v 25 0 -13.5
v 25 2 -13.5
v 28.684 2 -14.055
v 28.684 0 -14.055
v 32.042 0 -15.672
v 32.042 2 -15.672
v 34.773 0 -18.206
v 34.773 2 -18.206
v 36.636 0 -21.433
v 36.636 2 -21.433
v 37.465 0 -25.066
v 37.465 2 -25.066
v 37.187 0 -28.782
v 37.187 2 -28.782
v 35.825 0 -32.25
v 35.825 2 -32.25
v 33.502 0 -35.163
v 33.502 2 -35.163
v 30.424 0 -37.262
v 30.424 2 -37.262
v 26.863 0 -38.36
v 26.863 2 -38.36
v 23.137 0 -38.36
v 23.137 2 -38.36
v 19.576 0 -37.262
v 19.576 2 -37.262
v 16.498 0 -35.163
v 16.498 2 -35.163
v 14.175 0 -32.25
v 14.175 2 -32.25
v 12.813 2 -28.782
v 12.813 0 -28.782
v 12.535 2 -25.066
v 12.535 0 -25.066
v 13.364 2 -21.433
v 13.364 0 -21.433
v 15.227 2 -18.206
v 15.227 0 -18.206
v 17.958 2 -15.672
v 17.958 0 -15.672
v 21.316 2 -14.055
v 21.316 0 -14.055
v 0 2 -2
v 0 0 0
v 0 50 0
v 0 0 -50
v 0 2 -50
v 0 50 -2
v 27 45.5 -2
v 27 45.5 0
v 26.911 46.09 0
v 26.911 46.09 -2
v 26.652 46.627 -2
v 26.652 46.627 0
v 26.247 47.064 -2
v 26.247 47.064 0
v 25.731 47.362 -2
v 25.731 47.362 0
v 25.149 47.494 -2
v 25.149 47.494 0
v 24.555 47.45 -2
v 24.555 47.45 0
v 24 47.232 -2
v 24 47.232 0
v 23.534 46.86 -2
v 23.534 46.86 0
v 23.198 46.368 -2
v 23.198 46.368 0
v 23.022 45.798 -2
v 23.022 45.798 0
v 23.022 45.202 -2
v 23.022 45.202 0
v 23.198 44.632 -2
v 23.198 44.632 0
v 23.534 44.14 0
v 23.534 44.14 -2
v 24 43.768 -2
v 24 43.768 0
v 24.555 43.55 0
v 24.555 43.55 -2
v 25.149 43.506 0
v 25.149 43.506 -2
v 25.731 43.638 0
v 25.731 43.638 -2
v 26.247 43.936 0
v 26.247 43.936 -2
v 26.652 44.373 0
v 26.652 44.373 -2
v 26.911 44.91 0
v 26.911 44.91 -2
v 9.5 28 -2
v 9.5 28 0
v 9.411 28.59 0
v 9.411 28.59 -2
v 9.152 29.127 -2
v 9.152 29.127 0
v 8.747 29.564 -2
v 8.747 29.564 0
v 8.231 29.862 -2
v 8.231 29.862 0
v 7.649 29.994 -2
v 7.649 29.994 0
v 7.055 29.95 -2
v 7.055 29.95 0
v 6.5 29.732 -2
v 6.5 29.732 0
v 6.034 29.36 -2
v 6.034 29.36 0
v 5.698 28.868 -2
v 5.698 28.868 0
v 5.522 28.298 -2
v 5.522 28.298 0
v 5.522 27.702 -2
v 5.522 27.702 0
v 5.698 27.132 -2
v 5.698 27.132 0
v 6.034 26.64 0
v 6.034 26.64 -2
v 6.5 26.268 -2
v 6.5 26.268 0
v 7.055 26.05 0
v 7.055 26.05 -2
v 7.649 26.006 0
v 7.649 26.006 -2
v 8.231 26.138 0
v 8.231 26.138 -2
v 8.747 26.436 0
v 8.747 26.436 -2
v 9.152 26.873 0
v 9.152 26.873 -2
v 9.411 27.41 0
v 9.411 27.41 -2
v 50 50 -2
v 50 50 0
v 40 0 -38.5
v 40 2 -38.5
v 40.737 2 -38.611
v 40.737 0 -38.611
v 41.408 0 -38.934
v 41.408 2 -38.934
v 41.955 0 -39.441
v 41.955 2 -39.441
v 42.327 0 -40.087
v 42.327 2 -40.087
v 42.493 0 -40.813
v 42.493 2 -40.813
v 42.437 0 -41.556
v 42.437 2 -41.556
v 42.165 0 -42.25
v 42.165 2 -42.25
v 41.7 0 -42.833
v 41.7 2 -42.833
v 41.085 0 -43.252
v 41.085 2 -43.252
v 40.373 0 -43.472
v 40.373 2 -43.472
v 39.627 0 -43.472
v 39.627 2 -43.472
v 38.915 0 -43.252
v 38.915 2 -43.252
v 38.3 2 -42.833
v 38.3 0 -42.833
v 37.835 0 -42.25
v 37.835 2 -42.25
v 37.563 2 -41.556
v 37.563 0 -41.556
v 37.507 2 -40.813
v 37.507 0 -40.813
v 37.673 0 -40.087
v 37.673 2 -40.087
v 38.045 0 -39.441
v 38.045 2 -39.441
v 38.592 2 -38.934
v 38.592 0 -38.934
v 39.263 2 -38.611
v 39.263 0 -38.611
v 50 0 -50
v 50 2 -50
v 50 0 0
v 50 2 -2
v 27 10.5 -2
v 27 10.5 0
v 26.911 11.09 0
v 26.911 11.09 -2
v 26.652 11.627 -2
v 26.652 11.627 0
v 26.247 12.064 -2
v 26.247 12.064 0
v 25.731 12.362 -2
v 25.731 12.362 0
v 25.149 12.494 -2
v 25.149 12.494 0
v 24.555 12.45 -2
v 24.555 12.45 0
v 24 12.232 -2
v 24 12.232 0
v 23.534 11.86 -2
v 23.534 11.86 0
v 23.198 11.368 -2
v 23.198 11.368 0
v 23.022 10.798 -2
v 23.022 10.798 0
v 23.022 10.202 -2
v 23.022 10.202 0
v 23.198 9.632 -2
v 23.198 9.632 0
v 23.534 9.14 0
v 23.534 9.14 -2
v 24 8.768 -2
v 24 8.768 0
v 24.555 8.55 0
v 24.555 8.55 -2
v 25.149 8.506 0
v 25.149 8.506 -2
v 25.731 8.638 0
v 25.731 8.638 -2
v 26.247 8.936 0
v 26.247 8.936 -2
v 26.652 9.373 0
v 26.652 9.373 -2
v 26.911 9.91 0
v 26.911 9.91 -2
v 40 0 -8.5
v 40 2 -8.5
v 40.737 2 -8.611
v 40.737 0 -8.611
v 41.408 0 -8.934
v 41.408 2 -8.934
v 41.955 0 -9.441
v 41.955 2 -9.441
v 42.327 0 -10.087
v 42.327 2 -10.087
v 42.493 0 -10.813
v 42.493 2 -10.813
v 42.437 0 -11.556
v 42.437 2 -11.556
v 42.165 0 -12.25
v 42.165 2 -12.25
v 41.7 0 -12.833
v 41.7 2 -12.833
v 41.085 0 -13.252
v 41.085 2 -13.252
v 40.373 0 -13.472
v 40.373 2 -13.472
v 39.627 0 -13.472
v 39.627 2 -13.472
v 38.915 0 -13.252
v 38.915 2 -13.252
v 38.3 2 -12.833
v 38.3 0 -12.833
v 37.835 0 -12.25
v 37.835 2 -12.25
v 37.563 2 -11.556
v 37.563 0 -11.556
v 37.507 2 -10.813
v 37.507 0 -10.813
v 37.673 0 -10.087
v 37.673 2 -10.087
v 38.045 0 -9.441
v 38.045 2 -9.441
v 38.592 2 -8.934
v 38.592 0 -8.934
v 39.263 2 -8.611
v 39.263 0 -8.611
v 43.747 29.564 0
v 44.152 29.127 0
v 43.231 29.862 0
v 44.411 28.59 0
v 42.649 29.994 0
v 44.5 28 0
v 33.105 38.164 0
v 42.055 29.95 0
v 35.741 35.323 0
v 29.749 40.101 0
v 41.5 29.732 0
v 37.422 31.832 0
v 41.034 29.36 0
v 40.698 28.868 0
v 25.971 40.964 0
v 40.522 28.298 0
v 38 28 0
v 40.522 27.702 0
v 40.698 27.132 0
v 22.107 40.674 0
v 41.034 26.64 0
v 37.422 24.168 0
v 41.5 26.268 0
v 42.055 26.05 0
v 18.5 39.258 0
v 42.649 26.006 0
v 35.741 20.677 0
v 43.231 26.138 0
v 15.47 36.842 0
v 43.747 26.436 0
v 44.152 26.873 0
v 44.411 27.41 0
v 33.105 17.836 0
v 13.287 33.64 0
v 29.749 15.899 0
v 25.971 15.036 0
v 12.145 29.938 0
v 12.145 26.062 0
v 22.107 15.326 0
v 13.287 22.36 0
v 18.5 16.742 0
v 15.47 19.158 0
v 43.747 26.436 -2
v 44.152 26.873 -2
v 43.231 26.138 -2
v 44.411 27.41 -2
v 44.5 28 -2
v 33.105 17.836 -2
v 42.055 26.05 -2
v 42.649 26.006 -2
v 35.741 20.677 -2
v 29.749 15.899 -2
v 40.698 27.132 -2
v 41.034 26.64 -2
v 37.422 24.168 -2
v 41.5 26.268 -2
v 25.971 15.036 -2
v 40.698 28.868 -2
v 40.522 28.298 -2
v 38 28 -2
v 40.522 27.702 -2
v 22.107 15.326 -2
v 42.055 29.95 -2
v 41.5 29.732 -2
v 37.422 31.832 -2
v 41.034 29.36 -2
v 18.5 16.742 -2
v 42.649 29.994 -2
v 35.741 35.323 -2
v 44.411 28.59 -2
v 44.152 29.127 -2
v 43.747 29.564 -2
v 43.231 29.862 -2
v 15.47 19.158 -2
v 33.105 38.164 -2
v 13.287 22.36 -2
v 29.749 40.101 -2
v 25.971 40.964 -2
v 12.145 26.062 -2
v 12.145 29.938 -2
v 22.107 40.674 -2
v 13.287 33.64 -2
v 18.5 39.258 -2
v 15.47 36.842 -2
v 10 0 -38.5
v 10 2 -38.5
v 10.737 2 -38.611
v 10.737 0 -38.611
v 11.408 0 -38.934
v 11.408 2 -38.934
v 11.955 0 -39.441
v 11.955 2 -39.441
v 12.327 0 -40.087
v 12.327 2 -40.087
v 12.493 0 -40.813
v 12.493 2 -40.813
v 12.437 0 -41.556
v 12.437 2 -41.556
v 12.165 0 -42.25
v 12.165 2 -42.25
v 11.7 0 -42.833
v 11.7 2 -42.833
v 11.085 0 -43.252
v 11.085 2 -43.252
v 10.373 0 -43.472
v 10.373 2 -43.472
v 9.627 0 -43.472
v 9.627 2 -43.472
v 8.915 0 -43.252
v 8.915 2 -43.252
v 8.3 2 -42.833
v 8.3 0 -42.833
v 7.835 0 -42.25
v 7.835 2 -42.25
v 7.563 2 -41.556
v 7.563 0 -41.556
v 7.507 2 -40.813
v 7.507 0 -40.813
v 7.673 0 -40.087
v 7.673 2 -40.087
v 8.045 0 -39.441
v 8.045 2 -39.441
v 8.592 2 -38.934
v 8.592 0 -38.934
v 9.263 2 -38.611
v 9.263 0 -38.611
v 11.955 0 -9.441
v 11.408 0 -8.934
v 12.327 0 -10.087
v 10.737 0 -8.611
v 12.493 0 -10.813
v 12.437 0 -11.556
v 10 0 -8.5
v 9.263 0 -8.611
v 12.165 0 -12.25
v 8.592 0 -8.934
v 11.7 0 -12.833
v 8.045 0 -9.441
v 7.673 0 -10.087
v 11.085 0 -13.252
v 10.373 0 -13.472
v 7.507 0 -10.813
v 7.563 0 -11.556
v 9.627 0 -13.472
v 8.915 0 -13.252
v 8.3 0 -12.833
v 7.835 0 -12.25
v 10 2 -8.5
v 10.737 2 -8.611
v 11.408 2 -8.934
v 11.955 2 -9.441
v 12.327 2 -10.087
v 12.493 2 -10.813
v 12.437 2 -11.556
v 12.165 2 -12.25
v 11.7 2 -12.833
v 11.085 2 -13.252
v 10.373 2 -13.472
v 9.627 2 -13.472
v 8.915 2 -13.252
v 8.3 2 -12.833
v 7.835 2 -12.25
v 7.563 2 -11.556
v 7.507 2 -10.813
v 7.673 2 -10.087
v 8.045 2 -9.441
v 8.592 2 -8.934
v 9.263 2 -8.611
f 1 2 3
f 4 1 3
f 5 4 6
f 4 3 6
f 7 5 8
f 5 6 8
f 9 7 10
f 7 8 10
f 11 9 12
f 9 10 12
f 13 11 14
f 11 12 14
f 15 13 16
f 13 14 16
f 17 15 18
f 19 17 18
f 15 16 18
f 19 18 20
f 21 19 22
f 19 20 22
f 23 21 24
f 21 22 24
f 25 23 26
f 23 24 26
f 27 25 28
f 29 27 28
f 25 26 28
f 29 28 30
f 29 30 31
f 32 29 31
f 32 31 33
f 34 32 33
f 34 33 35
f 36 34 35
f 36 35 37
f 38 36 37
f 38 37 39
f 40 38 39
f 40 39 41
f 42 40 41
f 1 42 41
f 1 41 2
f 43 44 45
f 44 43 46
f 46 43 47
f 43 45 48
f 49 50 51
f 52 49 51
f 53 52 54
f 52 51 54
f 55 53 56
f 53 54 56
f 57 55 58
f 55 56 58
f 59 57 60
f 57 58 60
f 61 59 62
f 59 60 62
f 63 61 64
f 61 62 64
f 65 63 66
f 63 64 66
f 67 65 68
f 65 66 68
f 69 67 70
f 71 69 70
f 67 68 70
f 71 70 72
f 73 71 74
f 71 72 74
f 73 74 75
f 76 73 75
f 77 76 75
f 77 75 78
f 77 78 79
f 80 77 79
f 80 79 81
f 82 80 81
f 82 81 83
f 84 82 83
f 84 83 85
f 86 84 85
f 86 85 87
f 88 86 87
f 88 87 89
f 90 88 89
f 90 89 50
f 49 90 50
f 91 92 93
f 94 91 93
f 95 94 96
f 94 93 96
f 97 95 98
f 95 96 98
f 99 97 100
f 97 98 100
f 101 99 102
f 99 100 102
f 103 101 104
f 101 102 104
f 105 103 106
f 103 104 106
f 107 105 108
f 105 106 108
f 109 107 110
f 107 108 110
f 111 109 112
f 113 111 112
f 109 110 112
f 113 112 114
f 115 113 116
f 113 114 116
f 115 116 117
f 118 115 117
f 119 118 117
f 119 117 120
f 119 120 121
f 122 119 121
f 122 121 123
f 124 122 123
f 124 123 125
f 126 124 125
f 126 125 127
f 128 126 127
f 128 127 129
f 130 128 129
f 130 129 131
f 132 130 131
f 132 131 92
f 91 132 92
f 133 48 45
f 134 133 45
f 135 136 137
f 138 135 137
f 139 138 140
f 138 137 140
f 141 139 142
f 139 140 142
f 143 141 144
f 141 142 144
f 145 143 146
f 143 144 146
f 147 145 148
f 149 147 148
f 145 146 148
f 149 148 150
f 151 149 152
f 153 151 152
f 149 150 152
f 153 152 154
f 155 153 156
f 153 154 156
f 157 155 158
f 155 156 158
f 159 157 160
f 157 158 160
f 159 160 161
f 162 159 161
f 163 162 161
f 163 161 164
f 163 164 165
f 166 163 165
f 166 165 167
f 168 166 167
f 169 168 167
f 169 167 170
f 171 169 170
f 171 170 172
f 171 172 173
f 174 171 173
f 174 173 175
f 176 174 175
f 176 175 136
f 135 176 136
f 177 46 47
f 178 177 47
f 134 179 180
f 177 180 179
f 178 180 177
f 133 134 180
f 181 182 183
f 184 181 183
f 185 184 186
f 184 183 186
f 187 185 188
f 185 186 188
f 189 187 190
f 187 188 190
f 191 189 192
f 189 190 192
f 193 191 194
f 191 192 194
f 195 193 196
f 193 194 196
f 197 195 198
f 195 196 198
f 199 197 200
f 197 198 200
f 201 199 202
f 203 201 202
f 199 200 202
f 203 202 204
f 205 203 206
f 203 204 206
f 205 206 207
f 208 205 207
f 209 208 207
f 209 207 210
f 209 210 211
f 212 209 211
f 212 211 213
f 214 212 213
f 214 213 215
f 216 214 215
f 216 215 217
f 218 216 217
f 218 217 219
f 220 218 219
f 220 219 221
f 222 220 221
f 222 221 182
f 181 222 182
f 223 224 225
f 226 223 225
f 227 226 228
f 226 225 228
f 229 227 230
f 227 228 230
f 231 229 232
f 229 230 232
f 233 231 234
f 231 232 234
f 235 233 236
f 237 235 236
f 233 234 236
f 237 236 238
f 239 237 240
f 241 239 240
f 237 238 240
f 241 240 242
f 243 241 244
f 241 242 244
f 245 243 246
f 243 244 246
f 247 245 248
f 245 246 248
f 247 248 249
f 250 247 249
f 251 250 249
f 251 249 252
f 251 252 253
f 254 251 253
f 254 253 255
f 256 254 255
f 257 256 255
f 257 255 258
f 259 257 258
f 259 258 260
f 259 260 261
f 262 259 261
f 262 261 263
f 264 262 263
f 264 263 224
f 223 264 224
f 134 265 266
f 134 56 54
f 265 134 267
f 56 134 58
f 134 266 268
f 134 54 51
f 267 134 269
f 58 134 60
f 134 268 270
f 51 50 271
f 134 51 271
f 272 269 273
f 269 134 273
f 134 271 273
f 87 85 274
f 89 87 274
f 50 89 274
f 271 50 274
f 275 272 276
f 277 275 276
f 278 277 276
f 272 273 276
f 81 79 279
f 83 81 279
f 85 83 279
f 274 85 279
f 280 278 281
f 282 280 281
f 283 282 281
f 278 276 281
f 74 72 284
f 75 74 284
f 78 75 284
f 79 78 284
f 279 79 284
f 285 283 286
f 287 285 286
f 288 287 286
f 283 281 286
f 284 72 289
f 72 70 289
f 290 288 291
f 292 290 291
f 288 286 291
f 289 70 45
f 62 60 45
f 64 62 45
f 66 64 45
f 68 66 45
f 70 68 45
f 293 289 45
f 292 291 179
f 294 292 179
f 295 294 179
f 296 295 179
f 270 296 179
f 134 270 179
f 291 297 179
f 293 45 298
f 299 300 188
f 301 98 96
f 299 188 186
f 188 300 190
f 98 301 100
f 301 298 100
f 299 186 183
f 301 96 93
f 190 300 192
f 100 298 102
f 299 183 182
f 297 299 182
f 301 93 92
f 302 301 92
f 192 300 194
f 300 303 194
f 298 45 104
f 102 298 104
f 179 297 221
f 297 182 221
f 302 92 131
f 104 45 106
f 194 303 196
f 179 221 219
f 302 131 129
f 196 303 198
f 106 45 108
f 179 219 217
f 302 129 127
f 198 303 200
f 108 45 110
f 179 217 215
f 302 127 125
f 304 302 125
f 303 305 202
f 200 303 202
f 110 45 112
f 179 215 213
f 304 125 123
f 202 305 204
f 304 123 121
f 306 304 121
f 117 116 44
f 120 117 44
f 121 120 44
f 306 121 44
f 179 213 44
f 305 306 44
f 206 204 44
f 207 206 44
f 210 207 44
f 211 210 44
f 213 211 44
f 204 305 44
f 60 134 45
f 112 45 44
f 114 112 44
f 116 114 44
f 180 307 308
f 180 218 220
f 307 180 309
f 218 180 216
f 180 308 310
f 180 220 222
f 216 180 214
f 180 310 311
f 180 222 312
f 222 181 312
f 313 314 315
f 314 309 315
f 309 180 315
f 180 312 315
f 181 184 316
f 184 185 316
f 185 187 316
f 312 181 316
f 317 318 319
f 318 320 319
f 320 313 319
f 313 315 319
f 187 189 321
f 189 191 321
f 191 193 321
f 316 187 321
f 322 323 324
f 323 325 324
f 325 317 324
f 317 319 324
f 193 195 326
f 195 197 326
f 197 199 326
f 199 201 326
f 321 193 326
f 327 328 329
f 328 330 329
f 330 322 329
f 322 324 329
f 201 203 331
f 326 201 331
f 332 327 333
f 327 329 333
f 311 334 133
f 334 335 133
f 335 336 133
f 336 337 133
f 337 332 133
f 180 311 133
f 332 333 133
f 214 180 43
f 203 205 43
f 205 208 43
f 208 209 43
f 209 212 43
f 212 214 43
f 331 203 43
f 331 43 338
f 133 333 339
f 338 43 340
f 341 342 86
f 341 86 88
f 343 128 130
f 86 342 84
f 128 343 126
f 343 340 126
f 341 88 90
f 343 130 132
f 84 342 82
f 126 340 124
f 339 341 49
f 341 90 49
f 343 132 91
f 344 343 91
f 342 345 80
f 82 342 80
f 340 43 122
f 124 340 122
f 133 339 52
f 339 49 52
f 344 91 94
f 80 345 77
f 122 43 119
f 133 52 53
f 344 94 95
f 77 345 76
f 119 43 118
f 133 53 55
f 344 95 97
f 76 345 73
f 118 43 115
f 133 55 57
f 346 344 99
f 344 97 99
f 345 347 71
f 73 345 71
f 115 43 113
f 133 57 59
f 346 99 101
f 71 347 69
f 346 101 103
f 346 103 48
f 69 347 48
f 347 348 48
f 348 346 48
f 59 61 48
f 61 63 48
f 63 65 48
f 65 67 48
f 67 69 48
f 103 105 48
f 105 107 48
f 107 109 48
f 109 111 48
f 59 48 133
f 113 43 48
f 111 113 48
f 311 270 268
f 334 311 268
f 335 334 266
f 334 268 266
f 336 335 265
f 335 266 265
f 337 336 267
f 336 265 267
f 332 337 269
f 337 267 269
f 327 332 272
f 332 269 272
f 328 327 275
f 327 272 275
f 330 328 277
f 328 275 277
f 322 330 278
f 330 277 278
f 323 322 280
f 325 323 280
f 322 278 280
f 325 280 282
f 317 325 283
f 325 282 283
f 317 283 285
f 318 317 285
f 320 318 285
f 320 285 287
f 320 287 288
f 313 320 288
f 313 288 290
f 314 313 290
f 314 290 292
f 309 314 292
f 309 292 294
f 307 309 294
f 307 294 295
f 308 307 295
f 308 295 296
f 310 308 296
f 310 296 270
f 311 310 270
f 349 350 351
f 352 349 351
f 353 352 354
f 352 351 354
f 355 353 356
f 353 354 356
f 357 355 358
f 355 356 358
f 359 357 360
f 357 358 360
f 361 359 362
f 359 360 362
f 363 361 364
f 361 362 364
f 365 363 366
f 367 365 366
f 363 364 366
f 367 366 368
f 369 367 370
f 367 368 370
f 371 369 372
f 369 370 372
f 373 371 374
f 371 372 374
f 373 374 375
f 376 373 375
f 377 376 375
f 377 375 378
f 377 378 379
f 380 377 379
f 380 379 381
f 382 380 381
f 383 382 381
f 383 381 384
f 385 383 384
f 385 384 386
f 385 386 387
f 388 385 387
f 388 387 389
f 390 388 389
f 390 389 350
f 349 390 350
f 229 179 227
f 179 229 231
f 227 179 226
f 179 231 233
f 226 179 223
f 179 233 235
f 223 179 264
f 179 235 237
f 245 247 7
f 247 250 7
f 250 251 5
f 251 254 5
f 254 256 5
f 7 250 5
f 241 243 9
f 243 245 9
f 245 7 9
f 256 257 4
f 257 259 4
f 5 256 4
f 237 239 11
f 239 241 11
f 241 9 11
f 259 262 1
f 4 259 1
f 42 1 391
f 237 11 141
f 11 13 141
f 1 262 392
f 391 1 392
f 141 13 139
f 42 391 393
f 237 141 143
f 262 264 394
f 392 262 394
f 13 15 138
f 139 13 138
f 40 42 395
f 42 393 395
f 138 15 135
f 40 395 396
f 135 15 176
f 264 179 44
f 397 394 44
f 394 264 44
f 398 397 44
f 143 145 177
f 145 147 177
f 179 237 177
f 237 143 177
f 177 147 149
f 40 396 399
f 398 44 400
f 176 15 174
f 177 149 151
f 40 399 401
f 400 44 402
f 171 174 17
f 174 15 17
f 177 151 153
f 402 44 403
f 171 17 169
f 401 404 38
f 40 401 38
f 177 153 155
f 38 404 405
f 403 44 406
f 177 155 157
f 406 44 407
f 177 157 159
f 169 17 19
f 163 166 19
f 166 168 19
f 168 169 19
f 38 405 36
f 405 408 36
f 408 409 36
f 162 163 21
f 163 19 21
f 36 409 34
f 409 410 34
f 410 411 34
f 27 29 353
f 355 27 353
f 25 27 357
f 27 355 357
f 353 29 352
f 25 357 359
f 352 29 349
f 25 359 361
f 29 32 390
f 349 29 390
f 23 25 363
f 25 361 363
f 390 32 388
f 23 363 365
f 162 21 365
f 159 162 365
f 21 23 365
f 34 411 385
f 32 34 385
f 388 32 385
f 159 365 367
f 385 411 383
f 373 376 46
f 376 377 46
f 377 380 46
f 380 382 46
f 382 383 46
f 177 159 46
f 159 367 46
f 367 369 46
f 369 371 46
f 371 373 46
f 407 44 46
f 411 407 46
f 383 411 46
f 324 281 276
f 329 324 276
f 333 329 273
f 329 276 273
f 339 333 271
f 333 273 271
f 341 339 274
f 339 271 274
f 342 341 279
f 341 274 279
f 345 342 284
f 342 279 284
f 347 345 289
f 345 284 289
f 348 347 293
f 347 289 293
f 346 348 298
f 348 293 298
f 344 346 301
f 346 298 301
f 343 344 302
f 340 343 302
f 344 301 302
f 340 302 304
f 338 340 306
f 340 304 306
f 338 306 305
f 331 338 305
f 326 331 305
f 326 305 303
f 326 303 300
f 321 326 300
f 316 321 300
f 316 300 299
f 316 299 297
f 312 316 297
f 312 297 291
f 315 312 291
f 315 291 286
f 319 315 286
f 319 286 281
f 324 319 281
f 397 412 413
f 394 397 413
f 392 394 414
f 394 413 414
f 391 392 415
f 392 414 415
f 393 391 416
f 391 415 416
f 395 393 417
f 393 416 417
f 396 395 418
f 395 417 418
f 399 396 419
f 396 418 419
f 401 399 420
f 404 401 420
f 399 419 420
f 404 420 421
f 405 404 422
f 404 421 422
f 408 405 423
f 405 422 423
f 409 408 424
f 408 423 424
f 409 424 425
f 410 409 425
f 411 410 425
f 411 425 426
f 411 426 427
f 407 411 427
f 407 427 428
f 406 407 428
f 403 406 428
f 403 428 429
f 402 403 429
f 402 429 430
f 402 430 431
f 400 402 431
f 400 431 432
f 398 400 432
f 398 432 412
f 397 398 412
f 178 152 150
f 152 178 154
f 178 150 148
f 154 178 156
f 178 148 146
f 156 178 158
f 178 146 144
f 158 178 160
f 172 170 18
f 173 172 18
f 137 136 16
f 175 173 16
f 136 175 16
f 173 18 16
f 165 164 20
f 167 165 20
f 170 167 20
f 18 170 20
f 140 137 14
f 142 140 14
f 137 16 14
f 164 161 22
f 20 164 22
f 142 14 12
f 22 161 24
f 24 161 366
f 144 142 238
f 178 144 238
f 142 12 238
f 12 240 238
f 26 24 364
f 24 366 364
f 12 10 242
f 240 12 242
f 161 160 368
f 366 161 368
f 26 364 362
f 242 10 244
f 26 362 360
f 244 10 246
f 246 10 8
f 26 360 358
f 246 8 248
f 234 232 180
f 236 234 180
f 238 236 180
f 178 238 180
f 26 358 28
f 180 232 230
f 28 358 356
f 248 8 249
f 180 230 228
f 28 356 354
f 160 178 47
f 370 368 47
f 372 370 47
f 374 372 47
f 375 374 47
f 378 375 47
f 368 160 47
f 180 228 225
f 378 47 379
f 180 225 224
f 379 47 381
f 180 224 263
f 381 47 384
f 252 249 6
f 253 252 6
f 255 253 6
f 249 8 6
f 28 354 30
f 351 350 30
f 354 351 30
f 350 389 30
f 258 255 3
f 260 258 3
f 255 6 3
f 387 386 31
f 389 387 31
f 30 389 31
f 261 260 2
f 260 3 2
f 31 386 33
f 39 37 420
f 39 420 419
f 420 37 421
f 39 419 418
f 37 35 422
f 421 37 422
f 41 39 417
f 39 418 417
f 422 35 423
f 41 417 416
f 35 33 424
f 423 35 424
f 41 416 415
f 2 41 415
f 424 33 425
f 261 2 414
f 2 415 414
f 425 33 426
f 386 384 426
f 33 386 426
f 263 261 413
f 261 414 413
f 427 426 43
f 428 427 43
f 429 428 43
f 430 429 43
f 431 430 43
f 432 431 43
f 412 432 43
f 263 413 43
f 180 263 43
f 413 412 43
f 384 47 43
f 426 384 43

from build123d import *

# Parameters (mm, degrees)
EXTRUDE_1_DEPTH     = 50
SKETCH_2_R          = 13
SKETCH_2_R_2        = 2
CUT_EXTRUDE_1_DEPTH = 50
SKETCH_3_R          = 12.5
SKETCH_3_R_2        = 2.5
CUT_EXTRUDE_2_DEPTH = 50


with BuildPart() as part:
    # 草图1 → 凸台-拉伸1 (new body)
    with BuildSketch(Plane(origin=(0, 0, 0), x_dir=(0, 0, -1), z_dir=(1, 0, 0))):
        Polygon((0, 50), (0, 0), (50, 0), (50, 2), (2, 2), (2, 50), align=None)
    extrude(amount=EXTRUDE_1_DEPTH)

    # 草图2 → 切除-拉伸1 (cut)
    with BuildSketch(Plane.XY):
        with Locations((25, 28)):
            Circle(SKETCH_2_R)
        with Locations((7.5, 28)):
            Circle(SKETCH_2_R_2)
        with Locations((25, 45.5)):
            Circle(SKETCH_2_R_2)
        with Locations((25, 10.5)):
            Circle(SKETCH_2_R_2)
        with Locations((42.5, 28)):
            Circle(SKETCH_2_R_2)
    extrude(amount=-CUT_EXTRUDE_1_DEPTH, mode=Mode.SUBTRACT)

    # 草图3 → 切除-拉伸2 (cut)
    with BuildSketch(Plane(origin=(0, 2, 0), x_dir=(1, 0, 0), z_dir=(0, 1, 0))):
        with Locations(Location((25, 26, 0), (0, 0, 270))):
            Circle(SKETCH_3_R)
        with Locations(Location((40, 41, 0), (0, 0, 270))):
            Circle(SKETCH_3_R_2)
        with Locations(Location((40, 11, 0), (0, 0, 270))):
            Circle(SKETCH_3_R_2)
        with Locations(Location((10, 41, 0), (0, 0, 270))):
            Circle(SKETCH_3_R_2)
        with Locations(Location((10, 11, 0), (0, 0, 270))):
            Circle(SKETCH_3_R_2)
    extrude(amount=-CUT_EXTRUDE_2_DEPTH, mode=Mode.SUBTRACT)


solid = part.part
